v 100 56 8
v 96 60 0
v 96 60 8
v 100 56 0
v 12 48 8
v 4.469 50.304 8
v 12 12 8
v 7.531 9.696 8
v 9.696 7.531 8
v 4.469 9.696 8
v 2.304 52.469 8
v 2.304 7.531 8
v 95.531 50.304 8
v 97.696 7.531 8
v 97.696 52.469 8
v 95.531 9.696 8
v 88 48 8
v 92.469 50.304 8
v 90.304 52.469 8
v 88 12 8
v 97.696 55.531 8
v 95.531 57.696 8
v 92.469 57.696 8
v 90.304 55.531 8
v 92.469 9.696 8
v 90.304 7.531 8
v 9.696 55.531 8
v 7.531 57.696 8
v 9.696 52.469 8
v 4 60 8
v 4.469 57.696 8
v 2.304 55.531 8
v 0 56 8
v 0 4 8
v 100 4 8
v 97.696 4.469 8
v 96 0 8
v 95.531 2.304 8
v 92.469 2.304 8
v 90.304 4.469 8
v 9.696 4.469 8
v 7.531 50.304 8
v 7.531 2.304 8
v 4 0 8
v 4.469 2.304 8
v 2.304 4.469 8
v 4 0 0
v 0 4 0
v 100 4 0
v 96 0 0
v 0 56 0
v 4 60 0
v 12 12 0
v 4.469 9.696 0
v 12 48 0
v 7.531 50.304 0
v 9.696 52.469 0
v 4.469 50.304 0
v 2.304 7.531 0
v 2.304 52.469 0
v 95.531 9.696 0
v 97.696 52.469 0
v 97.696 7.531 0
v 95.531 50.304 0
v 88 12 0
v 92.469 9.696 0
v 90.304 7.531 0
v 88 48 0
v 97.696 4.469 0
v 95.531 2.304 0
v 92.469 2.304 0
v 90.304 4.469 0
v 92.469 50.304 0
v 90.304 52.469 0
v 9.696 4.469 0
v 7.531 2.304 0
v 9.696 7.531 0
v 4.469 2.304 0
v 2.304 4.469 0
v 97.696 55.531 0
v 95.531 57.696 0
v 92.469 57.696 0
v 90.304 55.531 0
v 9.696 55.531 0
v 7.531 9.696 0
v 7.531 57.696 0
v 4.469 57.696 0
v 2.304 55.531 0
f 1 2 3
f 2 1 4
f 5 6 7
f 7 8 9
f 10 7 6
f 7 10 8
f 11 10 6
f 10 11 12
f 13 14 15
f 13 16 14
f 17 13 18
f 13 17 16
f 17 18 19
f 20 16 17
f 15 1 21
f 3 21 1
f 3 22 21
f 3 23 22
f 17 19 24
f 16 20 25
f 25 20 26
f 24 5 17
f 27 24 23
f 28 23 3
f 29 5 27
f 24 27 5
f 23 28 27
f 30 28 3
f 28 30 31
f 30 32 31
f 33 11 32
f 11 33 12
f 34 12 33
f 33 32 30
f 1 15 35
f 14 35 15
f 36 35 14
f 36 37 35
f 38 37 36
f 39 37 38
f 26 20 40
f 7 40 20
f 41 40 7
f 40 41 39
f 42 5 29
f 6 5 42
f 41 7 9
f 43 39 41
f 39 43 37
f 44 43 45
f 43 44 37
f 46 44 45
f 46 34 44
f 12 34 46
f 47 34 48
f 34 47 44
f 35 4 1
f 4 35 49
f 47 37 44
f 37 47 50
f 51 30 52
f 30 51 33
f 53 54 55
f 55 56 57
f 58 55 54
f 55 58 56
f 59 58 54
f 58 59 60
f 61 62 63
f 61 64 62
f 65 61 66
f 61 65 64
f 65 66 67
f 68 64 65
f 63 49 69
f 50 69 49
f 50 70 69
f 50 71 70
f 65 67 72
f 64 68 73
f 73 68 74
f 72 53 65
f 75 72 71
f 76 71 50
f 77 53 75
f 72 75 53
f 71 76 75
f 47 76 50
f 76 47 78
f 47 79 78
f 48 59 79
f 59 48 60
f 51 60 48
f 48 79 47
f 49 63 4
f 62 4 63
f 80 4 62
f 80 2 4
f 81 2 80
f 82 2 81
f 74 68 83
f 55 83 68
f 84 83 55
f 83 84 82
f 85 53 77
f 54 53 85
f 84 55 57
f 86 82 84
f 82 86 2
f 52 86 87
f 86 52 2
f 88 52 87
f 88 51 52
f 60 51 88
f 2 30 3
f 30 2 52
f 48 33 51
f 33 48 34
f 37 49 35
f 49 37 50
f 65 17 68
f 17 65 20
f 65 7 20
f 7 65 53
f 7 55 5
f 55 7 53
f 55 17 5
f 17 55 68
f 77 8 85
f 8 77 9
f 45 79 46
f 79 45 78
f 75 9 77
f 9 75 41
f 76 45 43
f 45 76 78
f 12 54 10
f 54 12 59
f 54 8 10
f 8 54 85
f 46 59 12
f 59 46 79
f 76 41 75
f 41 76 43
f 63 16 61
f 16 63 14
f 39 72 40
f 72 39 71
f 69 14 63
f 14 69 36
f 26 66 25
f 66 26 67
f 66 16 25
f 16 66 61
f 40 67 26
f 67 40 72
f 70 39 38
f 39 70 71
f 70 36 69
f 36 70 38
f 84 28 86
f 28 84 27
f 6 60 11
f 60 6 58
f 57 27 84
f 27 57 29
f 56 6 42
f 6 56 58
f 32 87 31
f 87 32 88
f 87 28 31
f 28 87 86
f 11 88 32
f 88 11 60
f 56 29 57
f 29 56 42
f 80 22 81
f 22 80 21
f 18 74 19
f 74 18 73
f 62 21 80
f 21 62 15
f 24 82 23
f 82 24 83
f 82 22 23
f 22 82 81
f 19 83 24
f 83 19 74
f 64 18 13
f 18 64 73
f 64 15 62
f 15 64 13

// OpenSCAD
$fn = 32;

// ----------------------------------------------------------------------
// Frame plate: 100 x 60 frame, 12 mm rails
// ----------------------------------------------------------------------

// --- parameters (mm) ---
plate_l = 100;            // plate length, X
plate_w = 60;             // plate width, Y
plate_t = 8;              // plate thickness, Z (extrusion height)
corner_c = 4;             // corner chamfer
frame_bar = 12;           // frame rail width
bolt_r = 4;               // corner bolt window radius
bolt_inset = 6;           // bolt centre inset from the edges

win_l = plate_l - 2 * frame_bar;  // window length
win_w = plate_w - 2 * frame_bar;  // window width
bolt_d = 2 * bolt_r;  // corner hole diameter

profile = [[4, 0], [96, 0], [100, 4], [100, 56], [96, 60], [4, 60], [0, 56], [0, 4]];  // primary outline, 8 points, counter clockwise
void_1 = [[12, 12], [88, 12], [88, 48], [12, 48]];  // the window, 4 points
void_2 = [[9.696, 7.531], [7.531, 9.696], [4.469, 9.696], [2.304, 7.531], [2.304, 4.469], [4.469, 2.304], [7.531, 2.304], [9.696, 4.469]];  // corner bolt window, 8 points
void_3 = [[97.696, 7.531], [95.531, 9.696], [92.469, 9.696], [90.304, 7.531], [90.304, 4.469], [92.469, 2.304], [95.531, 2.304], [97.696, 4.469]];  // corner bolt window, 8 points
void_4 = [[9.696, 55.531], [7.531, 57.696], [4.469, 57.696], [2.304, 55.531], [2.304, 52.469], [4.469, 50.304], [7.531, 50.304], [9.696, 52.469]];  // corner bolt window, 8 points
void_5 = [[97.696, 55.531], [95.531, 57.696], [92.469, 57.696], [90.304, 55.531], [90.304, 52.469], [92.469, 50.304], [95.531, 50.304], [97.696, 52.469]];  // corner bolt window, 8 points

// --- the one profile operation ---
difference() {
  linear_extrude(height = plate_t) polygon(points = profile);
  translate([0, 0, -1])
    linear_extrude(height = plate_t + 2) polygon(points = void_1);
  translate([0, 0, -1])
    linear_extrude(height = plate_t + 2) polygon(points = void_2);
  translate([0, 0, -1])
    linear_extrude(height = plate_t + 2) polygon(points = void_3);
  translate([0, 0, -1])
    linear_extrude(height = plate_t + 2) polygon(points = void_4);
  translate([0, 0, -1])
    linear_extrude(height = plate_t + 2) polygon(points = void_5);
}
